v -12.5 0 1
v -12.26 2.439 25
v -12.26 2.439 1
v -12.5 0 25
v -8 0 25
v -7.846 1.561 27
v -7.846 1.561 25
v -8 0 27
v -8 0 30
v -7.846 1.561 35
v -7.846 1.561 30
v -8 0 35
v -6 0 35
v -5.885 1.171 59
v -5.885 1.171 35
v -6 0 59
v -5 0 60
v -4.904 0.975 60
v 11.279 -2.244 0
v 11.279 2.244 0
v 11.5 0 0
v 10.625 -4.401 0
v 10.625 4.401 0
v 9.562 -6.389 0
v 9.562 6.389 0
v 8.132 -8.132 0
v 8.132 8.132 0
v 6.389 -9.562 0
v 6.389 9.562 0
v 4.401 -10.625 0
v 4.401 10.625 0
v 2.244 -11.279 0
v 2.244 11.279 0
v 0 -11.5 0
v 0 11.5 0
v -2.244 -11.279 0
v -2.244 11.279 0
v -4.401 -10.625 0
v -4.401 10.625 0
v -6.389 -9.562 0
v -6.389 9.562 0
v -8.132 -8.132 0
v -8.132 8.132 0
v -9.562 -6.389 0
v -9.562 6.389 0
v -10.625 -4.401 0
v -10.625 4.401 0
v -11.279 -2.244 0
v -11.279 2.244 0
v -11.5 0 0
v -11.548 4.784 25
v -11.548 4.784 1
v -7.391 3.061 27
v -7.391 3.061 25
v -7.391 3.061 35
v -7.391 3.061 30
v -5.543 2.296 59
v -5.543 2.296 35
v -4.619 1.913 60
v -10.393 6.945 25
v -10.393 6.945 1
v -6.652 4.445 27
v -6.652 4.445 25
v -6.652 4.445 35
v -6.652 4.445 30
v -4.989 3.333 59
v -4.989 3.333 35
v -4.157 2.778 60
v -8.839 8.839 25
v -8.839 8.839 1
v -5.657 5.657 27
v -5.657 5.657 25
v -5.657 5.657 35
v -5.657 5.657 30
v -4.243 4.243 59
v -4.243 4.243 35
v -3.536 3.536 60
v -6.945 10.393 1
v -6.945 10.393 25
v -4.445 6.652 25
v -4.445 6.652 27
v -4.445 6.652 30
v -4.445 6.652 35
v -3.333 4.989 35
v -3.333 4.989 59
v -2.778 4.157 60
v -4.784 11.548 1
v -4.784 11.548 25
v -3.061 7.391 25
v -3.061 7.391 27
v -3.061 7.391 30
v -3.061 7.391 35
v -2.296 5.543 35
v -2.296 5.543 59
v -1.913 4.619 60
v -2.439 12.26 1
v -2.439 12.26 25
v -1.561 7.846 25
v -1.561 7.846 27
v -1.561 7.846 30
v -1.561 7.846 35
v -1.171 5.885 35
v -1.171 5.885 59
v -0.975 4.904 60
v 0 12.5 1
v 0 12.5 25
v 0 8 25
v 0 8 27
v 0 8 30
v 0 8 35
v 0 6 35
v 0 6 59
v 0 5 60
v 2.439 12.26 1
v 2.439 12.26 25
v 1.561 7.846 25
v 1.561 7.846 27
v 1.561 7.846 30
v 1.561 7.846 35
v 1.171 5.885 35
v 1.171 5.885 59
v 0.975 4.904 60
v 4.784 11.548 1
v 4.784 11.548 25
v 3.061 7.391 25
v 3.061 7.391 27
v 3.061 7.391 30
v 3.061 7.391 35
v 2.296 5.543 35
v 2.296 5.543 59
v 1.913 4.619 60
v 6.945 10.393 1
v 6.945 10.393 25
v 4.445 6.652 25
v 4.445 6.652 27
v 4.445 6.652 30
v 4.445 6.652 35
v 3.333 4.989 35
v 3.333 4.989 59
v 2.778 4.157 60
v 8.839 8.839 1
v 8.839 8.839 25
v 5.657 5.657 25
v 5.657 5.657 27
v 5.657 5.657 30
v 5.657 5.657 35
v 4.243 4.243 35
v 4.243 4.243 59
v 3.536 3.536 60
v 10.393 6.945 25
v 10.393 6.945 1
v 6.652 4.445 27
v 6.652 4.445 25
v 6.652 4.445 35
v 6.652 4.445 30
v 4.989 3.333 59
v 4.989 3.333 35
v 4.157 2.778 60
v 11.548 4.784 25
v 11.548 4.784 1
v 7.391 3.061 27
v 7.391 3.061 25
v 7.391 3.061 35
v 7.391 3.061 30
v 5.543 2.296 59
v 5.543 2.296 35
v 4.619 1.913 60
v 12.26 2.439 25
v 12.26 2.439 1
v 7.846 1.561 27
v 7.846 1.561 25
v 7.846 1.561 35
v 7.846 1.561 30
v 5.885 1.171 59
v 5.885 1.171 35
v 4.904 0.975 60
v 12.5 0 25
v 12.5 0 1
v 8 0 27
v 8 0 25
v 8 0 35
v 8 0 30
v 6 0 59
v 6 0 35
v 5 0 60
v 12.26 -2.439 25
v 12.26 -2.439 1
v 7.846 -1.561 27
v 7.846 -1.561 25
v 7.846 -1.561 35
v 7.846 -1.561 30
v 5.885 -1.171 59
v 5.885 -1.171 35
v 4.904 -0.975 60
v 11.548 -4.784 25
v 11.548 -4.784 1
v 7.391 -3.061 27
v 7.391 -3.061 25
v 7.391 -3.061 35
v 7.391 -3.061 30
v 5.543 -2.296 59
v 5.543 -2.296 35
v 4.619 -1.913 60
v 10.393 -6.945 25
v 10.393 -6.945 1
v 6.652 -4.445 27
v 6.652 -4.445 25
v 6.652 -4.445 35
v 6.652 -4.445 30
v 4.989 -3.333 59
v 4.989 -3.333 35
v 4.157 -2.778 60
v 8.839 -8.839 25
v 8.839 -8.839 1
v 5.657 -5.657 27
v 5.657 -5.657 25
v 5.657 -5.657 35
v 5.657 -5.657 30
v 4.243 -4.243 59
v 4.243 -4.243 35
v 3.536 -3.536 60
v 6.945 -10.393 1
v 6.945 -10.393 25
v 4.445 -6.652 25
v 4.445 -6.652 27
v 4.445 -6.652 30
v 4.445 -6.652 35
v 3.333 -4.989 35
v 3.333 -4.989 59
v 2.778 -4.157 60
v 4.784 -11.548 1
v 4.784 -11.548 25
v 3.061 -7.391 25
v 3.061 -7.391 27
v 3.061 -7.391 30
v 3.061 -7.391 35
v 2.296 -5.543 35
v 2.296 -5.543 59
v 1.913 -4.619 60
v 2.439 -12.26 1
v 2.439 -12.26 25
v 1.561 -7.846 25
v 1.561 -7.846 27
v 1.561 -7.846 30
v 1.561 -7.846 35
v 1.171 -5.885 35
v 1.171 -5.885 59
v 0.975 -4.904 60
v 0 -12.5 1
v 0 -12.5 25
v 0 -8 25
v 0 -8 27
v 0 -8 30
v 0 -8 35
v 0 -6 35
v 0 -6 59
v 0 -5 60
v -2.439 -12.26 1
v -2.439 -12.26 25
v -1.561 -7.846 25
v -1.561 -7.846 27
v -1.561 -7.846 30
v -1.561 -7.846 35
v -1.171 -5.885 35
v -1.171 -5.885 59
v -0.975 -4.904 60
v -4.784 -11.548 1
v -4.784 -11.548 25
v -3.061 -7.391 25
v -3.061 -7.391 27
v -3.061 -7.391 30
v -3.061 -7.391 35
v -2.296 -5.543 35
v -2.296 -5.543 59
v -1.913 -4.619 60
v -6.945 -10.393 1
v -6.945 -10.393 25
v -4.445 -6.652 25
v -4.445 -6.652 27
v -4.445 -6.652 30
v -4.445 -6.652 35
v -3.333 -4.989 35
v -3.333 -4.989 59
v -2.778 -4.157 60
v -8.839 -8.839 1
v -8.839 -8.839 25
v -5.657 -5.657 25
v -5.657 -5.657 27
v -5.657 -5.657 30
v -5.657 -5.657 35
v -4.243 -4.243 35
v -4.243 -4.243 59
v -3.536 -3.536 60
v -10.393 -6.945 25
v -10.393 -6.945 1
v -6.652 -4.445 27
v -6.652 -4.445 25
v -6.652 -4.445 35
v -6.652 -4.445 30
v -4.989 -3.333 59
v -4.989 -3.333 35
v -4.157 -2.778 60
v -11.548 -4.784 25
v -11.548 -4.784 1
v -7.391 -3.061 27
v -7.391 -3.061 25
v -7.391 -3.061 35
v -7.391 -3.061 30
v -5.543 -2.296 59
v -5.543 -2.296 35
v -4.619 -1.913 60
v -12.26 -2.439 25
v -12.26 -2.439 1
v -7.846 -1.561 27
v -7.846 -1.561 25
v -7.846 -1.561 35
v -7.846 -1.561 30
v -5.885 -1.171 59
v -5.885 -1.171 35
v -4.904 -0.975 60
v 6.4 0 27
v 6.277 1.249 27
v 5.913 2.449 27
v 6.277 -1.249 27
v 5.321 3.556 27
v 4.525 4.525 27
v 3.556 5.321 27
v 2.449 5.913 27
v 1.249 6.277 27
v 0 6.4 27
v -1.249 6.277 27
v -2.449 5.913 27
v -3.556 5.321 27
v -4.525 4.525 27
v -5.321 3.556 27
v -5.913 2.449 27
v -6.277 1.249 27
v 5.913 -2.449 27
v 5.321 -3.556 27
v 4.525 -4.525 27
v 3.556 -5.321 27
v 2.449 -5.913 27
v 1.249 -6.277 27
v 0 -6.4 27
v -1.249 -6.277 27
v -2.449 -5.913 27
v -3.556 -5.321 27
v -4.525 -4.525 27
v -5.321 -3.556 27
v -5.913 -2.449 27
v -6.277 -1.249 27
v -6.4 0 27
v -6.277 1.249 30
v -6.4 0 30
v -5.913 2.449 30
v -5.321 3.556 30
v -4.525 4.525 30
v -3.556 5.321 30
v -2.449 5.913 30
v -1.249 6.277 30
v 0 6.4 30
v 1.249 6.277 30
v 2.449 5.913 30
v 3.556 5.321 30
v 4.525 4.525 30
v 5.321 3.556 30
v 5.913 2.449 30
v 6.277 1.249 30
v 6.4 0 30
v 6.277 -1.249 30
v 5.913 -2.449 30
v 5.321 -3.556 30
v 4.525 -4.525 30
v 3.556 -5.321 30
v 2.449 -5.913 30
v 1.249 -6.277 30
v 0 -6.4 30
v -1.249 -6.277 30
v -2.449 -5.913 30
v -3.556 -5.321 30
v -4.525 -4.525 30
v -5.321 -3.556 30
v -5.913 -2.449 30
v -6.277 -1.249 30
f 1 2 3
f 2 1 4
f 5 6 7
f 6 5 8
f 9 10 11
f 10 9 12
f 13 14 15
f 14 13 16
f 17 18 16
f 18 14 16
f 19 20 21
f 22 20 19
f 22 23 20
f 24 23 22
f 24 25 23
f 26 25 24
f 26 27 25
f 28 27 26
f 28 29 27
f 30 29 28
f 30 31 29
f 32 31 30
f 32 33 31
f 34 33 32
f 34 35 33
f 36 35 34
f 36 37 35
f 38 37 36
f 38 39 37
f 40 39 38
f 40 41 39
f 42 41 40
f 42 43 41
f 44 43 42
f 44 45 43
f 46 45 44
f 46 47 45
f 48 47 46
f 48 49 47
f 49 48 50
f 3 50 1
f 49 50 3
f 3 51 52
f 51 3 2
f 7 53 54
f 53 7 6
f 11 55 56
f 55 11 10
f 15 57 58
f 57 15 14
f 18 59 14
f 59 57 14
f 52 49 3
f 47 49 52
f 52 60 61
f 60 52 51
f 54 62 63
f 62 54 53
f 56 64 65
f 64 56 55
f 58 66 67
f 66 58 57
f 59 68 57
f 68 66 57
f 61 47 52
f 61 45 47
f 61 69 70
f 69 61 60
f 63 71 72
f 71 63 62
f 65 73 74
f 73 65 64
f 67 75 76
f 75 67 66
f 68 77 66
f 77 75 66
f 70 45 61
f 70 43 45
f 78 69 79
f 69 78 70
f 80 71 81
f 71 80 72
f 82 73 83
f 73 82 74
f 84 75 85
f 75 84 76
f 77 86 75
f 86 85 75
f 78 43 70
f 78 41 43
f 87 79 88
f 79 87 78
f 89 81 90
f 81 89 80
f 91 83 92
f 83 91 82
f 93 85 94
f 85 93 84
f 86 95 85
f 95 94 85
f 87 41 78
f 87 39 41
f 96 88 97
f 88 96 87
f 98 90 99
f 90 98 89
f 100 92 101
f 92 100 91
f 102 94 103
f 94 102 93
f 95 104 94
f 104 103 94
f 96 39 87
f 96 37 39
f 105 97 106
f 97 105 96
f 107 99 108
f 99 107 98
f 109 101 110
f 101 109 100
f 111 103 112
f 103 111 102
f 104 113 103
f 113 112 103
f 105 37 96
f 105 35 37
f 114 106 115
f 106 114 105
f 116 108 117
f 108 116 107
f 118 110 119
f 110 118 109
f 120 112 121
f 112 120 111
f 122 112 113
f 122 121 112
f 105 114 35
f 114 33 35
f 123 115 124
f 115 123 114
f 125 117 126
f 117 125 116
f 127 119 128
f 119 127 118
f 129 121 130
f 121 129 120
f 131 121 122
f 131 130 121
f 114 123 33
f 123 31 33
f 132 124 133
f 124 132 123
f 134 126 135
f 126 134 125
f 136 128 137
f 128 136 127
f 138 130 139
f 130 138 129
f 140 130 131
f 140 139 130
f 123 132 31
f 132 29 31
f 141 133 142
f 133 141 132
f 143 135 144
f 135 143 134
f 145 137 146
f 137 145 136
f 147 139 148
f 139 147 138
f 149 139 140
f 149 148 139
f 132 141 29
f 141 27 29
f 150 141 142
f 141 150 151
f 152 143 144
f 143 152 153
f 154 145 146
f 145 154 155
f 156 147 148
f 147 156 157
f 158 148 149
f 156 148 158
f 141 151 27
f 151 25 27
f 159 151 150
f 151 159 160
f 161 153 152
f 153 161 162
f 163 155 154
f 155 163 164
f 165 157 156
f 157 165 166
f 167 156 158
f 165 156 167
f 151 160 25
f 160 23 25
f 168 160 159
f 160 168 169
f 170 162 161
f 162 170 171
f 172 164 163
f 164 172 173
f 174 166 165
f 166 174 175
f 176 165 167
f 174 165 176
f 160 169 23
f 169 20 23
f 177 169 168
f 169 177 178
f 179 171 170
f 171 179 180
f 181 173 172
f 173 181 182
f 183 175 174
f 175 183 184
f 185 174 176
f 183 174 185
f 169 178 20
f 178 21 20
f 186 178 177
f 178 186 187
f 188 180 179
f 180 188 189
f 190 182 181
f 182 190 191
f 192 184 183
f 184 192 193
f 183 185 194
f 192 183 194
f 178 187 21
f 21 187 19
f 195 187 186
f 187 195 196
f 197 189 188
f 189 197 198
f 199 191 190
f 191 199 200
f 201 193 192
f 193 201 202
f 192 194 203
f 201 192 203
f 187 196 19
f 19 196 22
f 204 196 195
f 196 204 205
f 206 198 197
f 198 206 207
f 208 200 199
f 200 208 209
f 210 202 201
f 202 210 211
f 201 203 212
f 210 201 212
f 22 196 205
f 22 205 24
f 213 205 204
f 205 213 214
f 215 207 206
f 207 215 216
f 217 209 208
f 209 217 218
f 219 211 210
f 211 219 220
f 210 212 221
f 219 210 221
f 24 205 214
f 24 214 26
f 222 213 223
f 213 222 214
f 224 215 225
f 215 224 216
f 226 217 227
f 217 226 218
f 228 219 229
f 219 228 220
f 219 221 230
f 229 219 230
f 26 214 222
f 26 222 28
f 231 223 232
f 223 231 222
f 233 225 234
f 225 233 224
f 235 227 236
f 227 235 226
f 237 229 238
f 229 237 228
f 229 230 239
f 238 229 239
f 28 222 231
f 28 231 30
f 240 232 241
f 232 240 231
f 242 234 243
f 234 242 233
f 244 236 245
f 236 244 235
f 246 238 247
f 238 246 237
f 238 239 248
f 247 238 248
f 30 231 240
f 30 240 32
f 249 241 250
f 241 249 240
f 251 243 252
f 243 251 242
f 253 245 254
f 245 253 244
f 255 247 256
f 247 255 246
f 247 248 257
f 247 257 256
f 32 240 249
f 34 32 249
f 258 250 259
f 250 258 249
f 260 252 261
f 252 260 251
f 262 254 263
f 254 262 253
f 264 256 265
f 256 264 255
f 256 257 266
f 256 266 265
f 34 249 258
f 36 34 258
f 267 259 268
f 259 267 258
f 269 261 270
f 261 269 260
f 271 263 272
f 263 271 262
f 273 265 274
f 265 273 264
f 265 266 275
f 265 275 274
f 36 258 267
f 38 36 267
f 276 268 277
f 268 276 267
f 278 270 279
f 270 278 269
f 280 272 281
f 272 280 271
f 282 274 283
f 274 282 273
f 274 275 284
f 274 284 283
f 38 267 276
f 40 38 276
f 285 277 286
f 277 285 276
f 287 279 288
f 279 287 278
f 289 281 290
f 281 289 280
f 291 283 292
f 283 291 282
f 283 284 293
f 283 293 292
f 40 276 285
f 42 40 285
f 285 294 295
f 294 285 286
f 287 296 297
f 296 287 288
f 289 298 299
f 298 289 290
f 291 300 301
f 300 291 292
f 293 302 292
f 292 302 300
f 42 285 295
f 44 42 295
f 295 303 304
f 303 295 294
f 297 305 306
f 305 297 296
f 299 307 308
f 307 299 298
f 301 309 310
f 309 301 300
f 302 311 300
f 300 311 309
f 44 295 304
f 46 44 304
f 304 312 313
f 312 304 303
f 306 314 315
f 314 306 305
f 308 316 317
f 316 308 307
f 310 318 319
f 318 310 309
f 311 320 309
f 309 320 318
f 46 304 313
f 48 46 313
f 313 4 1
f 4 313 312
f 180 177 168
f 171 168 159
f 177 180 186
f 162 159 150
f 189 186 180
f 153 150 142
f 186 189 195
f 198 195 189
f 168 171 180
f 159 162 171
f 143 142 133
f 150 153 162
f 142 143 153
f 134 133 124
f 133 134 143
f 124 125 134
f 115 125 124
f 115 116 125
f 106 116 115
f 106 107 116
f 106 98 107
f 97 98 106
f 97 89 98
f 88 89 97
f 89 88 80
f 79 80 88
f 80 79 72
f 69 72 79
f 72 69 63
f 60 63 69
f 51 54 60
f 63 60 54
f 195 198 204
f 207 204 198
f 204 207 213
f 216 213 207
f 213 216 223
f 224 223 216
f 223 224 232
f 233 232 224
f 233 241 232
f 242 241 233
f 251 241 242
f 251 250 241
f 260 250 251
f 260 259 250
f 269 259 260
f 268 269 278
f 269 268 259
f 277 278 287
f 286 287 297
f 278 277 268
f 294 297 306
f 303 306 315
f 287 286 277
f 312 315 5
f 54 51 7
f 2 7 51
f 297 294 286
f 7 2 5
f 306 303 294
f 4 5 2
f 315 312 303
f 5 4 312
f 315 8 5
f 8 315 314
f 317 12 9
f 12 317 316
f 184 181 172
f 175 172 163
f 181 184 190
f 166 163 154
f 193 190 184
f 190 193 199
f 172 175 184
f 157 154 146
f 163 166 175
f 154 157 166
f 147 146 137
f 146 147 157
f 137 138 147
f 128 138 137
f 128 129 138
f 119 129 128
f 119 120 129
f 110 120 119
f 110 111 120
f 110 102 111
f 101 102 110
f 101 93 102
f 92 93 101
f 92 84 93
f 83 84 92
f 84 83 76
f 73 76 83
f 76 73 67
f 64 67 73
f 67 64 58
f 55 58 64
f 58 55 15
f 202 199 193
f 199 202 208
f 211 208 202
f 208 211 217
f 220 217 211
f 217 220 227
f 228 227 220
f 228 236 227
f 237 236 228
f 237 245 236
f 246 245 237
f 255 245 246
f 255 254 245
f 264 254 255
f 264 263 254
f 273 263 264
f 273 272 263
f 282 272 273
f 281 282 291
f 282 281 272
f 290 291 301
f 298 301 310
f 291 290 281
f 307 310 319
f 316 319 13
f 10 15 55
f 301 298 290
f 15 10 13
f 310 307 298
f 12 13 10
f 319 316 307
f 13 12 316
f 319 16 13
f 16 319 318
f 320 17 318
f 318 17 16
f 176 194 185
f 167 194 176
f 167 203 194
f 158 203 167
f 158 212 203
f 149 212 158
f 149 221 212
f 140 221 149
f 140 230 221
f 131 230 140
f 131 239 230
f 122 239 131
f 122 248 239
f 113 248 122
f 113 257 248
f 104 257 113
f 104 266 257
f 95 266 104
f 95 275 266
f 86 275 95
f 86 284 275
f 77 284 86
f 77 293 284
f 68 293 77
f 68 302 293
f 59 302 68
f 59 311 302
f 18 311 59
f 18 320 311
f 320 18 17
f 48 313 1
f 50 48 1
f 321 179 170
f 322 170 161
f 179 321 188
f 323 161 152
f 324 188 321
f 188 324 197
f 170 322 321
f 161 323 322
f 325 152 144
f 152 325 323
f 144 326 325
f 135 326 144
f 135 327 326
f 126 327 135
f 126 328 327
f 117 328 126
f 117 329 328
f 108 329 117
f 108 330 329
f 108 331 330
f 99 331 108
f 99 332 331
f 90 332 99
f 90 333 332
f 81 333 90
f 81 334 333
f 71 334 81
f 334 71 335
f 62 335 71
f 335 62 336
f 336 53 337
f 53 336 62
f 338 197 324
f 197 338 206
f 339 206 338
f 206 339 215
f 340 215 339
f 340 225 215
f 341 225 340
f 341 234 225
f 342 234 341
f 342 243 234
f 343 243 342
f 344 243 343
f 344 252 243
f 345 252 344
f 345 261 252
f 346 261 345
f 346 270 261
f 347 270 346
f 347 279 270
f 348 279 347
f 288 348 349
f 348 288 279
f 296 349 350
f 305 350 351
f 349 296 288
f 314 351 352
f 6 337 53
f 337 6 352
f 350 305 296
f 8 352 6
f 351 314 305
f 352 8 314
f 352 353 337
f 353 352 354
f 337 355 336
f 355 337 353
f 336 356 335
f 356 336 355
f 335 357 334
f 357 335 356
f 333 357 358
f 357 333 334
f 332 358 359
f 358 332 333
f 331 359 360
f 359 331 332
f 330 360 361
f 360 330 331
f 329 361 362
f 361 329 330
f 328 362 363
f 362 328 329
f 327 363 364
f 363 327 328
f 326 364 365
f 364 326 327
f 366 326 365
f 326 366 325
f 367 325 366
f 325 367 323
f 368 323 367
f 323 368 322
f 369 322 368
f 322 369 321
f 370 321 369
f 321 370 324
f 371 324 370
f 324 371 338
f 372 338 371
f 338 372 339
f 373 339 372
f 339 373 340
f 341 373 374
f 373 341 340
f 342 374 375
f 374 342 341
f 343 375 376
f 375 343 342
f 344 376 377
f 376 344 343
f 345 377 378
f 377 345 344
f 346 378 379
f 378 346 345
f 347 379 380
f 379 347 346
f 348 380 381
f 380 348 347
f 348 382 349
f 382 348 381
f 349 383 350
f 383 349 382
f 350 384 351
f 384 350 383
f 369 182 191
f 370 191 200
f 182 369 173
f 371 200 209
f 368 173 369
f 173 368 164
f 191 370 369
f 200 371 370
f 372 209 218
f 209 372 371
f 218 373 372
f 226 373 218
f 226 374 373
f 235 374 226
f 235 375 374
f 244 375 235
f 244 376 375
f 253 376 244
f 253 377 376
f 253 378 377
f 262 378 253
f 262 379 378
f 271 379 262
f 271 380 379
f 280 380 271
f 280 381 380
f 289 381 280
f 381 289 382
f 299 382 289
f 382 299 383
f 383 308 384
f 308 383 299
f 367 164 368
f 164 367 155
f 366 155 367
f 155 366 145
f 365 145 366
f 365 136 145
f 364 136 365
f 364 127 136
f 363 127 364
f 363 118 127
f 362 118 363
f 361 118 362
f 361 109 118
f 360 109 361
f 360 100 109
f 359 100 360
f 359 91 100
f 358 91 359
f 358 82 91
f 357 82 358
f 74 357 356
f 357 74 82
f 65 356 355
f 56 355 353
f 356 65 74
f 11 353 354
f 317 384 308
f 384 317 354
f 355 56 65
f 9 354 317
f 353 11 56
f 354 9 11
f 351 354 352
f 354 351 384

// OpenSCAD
$fn = 32;

// ----------------------------------------------------------------------
// Stepped shaft: diameters 25, 16, 12 mm, 60 mm long
// ----------------------------------------------------------------------

// --- parameters (mm) ---
d1 = 25;                  // step 1 diameter
len1 = 25;                // step 1 length
d2 = 16;                  // step 2 diameter
len2 = 10;                // step 2 length
d3 = 12;                  // step 3 diameter
len3 = 25;                // step 3 length
total = 60;               // overall length
chamfer = 1;              // end chamfer
groove_r = 8;             // groove radius
groove_z = 27;            // groove position from the end
groove_w = 3;             // groove width
groove_d = 1.6;           // groove depth

/* closed turning profile: x is the radius, y is the length */
profile = [[0, 0], [12.5 - chamfer, 0], [12.5, chamfer], [12.5, 25], [8, 25], [8, 35], [6, 35], [6, 59], [5, 60], [0, 60]];

difference() {
  rotate_extrude() polygon(profile);
  /* circlip groove just behind the shoulder */
  rotate_extrude() translate([groove_r - groove_d, groove_z]) square([groove_d + 1, groove_w]);
}
